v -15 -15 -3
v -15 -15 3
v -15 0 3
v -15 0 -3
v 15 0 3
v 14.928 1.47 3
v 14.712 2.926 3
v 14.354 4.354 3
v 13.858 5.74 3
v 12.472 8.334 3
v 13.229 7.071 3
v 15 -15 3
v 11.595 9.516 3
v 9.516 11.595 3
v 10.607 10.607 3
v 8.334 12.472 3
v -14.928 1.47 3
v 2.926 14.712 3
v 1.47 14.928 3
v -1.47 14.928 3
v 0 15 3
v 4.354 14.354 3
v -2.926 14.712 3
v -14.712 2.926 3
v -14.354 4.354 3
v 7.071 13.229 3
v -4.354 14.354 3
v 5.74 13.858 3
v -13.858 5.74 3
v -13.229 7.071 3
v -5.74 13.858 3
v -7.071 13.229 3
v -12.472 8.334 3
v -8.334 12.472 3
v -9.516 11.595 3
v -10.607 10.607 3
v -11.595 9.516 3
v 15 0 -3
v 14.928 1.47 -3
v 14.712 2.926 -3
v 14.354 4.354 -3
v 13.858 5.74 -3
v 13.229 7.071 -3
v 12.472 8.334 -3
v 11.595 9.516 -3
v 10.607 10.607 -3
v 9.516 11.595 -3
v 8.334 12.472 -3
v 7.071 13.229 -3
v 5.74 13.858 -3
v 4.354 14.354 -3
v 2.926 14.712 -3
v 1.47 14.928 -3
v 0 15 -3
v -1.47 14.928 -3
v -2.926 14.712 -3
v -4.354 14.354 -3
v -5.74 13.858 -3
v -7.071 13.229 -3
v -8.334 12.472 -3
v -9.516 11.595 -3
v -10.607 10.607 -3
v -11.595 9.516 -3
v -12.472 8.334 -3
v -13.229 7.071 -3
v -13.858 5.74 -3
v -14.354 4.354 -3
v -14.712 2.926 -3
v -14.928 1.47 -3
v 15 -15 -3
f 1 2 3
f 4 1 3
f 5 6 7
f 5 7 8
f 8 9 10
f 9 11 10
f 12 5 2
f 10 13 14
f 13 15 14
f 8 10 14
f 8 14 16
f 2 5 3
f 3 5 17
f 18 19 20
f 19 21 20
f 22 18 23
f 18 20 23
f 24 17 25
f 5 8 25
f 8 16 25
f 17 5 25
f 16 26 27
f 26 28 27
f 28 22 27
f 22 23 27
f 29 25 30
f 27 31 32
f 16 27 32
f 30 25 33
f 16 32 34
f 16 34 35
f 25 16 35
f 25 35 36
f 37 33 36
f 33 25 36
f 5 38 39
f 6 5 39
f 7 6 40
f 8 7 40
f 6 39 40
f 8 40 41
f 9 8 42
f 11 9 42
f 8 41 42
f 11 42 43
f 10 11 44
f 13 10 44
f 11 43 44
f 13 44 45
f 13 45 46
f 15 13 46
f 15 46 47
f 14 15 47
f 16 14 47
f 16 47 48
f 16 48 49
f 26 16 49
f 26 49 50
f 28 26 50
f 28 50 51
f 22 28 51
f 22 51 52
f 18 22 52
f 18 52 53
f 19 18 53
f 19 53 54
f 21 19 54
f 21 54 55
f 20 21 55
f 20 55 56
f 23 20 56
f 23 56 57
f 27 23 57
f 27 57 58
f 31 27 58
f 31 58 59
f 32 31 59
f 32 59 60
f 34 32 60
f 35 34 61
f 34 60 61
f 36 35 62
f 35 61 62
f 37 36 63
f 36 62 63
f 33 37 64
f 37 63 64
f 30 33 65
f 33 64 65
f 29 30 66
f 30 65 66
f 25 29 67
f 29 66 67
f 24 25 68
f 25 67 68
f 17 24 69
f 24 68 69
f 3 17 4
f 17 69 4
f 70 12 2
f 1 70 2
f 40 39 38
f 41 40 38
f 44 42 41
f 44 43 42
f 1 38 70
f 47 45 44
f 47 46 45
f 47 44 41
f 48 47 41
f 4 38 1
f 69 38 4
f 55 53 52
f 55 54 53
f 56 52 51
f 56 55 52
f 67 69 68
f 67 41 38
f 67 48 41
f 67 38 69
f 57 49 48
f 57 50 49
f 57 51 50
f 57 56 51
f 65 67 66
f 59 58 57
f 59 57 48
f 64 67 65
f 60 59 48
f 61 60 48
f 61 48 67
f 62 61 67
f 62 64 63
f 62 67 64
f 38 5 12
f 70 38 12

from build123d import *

# Parameters (mm, degrees)
SKETCH003_W  = 15
SKETCH003_H  = 3
PAD002_DEPTH = 6


with BuildPart() as twslot001:
    # Sketch003 → Revolution (revolve)
    with BuildSketch(Plane.XZ):
        with Locations((7.5, 1.5)):
            Rectangle(SKETCH003_W, SKETCH003_H)
    revolve(axis=Axis((0, 0, 0), (0, 0, 1)))


with BuildPart() as part_mirroring:
    # Part__Mirroring: instance of TWSlot001
    add(twslot001.part.mirror(Plane(origin=(0, 0, 0), x_dir=(0, 1, 0), z_dir=(0, 0, 1))))


with BuildPart() as refine_twslot004:
    # Fusion001 base: copy of TWSlot001
    add(twslot001.part)

    # Fusion001: union Part__Mirroring
    add(part_mirroring.part)

    # Sketch004 → Pad002 (new body)
    with BuildSketch(Plane.XY.offset(3)):
        with BuildLine():
            Line((15, 0), (15, -15))
            Line((15, -15), (-15, -15))
            Line((-15, -15), (-15, 0))
            Line((-15, 0), (-7, 0))
            ThreePointArc((-7, 0), (0, -7), (7, 0))
            Line((7, 0), (15, 0))
        make_face()
    extrude(amount=-PAD002_DEPTH)


solid = refine_twslot004.part
